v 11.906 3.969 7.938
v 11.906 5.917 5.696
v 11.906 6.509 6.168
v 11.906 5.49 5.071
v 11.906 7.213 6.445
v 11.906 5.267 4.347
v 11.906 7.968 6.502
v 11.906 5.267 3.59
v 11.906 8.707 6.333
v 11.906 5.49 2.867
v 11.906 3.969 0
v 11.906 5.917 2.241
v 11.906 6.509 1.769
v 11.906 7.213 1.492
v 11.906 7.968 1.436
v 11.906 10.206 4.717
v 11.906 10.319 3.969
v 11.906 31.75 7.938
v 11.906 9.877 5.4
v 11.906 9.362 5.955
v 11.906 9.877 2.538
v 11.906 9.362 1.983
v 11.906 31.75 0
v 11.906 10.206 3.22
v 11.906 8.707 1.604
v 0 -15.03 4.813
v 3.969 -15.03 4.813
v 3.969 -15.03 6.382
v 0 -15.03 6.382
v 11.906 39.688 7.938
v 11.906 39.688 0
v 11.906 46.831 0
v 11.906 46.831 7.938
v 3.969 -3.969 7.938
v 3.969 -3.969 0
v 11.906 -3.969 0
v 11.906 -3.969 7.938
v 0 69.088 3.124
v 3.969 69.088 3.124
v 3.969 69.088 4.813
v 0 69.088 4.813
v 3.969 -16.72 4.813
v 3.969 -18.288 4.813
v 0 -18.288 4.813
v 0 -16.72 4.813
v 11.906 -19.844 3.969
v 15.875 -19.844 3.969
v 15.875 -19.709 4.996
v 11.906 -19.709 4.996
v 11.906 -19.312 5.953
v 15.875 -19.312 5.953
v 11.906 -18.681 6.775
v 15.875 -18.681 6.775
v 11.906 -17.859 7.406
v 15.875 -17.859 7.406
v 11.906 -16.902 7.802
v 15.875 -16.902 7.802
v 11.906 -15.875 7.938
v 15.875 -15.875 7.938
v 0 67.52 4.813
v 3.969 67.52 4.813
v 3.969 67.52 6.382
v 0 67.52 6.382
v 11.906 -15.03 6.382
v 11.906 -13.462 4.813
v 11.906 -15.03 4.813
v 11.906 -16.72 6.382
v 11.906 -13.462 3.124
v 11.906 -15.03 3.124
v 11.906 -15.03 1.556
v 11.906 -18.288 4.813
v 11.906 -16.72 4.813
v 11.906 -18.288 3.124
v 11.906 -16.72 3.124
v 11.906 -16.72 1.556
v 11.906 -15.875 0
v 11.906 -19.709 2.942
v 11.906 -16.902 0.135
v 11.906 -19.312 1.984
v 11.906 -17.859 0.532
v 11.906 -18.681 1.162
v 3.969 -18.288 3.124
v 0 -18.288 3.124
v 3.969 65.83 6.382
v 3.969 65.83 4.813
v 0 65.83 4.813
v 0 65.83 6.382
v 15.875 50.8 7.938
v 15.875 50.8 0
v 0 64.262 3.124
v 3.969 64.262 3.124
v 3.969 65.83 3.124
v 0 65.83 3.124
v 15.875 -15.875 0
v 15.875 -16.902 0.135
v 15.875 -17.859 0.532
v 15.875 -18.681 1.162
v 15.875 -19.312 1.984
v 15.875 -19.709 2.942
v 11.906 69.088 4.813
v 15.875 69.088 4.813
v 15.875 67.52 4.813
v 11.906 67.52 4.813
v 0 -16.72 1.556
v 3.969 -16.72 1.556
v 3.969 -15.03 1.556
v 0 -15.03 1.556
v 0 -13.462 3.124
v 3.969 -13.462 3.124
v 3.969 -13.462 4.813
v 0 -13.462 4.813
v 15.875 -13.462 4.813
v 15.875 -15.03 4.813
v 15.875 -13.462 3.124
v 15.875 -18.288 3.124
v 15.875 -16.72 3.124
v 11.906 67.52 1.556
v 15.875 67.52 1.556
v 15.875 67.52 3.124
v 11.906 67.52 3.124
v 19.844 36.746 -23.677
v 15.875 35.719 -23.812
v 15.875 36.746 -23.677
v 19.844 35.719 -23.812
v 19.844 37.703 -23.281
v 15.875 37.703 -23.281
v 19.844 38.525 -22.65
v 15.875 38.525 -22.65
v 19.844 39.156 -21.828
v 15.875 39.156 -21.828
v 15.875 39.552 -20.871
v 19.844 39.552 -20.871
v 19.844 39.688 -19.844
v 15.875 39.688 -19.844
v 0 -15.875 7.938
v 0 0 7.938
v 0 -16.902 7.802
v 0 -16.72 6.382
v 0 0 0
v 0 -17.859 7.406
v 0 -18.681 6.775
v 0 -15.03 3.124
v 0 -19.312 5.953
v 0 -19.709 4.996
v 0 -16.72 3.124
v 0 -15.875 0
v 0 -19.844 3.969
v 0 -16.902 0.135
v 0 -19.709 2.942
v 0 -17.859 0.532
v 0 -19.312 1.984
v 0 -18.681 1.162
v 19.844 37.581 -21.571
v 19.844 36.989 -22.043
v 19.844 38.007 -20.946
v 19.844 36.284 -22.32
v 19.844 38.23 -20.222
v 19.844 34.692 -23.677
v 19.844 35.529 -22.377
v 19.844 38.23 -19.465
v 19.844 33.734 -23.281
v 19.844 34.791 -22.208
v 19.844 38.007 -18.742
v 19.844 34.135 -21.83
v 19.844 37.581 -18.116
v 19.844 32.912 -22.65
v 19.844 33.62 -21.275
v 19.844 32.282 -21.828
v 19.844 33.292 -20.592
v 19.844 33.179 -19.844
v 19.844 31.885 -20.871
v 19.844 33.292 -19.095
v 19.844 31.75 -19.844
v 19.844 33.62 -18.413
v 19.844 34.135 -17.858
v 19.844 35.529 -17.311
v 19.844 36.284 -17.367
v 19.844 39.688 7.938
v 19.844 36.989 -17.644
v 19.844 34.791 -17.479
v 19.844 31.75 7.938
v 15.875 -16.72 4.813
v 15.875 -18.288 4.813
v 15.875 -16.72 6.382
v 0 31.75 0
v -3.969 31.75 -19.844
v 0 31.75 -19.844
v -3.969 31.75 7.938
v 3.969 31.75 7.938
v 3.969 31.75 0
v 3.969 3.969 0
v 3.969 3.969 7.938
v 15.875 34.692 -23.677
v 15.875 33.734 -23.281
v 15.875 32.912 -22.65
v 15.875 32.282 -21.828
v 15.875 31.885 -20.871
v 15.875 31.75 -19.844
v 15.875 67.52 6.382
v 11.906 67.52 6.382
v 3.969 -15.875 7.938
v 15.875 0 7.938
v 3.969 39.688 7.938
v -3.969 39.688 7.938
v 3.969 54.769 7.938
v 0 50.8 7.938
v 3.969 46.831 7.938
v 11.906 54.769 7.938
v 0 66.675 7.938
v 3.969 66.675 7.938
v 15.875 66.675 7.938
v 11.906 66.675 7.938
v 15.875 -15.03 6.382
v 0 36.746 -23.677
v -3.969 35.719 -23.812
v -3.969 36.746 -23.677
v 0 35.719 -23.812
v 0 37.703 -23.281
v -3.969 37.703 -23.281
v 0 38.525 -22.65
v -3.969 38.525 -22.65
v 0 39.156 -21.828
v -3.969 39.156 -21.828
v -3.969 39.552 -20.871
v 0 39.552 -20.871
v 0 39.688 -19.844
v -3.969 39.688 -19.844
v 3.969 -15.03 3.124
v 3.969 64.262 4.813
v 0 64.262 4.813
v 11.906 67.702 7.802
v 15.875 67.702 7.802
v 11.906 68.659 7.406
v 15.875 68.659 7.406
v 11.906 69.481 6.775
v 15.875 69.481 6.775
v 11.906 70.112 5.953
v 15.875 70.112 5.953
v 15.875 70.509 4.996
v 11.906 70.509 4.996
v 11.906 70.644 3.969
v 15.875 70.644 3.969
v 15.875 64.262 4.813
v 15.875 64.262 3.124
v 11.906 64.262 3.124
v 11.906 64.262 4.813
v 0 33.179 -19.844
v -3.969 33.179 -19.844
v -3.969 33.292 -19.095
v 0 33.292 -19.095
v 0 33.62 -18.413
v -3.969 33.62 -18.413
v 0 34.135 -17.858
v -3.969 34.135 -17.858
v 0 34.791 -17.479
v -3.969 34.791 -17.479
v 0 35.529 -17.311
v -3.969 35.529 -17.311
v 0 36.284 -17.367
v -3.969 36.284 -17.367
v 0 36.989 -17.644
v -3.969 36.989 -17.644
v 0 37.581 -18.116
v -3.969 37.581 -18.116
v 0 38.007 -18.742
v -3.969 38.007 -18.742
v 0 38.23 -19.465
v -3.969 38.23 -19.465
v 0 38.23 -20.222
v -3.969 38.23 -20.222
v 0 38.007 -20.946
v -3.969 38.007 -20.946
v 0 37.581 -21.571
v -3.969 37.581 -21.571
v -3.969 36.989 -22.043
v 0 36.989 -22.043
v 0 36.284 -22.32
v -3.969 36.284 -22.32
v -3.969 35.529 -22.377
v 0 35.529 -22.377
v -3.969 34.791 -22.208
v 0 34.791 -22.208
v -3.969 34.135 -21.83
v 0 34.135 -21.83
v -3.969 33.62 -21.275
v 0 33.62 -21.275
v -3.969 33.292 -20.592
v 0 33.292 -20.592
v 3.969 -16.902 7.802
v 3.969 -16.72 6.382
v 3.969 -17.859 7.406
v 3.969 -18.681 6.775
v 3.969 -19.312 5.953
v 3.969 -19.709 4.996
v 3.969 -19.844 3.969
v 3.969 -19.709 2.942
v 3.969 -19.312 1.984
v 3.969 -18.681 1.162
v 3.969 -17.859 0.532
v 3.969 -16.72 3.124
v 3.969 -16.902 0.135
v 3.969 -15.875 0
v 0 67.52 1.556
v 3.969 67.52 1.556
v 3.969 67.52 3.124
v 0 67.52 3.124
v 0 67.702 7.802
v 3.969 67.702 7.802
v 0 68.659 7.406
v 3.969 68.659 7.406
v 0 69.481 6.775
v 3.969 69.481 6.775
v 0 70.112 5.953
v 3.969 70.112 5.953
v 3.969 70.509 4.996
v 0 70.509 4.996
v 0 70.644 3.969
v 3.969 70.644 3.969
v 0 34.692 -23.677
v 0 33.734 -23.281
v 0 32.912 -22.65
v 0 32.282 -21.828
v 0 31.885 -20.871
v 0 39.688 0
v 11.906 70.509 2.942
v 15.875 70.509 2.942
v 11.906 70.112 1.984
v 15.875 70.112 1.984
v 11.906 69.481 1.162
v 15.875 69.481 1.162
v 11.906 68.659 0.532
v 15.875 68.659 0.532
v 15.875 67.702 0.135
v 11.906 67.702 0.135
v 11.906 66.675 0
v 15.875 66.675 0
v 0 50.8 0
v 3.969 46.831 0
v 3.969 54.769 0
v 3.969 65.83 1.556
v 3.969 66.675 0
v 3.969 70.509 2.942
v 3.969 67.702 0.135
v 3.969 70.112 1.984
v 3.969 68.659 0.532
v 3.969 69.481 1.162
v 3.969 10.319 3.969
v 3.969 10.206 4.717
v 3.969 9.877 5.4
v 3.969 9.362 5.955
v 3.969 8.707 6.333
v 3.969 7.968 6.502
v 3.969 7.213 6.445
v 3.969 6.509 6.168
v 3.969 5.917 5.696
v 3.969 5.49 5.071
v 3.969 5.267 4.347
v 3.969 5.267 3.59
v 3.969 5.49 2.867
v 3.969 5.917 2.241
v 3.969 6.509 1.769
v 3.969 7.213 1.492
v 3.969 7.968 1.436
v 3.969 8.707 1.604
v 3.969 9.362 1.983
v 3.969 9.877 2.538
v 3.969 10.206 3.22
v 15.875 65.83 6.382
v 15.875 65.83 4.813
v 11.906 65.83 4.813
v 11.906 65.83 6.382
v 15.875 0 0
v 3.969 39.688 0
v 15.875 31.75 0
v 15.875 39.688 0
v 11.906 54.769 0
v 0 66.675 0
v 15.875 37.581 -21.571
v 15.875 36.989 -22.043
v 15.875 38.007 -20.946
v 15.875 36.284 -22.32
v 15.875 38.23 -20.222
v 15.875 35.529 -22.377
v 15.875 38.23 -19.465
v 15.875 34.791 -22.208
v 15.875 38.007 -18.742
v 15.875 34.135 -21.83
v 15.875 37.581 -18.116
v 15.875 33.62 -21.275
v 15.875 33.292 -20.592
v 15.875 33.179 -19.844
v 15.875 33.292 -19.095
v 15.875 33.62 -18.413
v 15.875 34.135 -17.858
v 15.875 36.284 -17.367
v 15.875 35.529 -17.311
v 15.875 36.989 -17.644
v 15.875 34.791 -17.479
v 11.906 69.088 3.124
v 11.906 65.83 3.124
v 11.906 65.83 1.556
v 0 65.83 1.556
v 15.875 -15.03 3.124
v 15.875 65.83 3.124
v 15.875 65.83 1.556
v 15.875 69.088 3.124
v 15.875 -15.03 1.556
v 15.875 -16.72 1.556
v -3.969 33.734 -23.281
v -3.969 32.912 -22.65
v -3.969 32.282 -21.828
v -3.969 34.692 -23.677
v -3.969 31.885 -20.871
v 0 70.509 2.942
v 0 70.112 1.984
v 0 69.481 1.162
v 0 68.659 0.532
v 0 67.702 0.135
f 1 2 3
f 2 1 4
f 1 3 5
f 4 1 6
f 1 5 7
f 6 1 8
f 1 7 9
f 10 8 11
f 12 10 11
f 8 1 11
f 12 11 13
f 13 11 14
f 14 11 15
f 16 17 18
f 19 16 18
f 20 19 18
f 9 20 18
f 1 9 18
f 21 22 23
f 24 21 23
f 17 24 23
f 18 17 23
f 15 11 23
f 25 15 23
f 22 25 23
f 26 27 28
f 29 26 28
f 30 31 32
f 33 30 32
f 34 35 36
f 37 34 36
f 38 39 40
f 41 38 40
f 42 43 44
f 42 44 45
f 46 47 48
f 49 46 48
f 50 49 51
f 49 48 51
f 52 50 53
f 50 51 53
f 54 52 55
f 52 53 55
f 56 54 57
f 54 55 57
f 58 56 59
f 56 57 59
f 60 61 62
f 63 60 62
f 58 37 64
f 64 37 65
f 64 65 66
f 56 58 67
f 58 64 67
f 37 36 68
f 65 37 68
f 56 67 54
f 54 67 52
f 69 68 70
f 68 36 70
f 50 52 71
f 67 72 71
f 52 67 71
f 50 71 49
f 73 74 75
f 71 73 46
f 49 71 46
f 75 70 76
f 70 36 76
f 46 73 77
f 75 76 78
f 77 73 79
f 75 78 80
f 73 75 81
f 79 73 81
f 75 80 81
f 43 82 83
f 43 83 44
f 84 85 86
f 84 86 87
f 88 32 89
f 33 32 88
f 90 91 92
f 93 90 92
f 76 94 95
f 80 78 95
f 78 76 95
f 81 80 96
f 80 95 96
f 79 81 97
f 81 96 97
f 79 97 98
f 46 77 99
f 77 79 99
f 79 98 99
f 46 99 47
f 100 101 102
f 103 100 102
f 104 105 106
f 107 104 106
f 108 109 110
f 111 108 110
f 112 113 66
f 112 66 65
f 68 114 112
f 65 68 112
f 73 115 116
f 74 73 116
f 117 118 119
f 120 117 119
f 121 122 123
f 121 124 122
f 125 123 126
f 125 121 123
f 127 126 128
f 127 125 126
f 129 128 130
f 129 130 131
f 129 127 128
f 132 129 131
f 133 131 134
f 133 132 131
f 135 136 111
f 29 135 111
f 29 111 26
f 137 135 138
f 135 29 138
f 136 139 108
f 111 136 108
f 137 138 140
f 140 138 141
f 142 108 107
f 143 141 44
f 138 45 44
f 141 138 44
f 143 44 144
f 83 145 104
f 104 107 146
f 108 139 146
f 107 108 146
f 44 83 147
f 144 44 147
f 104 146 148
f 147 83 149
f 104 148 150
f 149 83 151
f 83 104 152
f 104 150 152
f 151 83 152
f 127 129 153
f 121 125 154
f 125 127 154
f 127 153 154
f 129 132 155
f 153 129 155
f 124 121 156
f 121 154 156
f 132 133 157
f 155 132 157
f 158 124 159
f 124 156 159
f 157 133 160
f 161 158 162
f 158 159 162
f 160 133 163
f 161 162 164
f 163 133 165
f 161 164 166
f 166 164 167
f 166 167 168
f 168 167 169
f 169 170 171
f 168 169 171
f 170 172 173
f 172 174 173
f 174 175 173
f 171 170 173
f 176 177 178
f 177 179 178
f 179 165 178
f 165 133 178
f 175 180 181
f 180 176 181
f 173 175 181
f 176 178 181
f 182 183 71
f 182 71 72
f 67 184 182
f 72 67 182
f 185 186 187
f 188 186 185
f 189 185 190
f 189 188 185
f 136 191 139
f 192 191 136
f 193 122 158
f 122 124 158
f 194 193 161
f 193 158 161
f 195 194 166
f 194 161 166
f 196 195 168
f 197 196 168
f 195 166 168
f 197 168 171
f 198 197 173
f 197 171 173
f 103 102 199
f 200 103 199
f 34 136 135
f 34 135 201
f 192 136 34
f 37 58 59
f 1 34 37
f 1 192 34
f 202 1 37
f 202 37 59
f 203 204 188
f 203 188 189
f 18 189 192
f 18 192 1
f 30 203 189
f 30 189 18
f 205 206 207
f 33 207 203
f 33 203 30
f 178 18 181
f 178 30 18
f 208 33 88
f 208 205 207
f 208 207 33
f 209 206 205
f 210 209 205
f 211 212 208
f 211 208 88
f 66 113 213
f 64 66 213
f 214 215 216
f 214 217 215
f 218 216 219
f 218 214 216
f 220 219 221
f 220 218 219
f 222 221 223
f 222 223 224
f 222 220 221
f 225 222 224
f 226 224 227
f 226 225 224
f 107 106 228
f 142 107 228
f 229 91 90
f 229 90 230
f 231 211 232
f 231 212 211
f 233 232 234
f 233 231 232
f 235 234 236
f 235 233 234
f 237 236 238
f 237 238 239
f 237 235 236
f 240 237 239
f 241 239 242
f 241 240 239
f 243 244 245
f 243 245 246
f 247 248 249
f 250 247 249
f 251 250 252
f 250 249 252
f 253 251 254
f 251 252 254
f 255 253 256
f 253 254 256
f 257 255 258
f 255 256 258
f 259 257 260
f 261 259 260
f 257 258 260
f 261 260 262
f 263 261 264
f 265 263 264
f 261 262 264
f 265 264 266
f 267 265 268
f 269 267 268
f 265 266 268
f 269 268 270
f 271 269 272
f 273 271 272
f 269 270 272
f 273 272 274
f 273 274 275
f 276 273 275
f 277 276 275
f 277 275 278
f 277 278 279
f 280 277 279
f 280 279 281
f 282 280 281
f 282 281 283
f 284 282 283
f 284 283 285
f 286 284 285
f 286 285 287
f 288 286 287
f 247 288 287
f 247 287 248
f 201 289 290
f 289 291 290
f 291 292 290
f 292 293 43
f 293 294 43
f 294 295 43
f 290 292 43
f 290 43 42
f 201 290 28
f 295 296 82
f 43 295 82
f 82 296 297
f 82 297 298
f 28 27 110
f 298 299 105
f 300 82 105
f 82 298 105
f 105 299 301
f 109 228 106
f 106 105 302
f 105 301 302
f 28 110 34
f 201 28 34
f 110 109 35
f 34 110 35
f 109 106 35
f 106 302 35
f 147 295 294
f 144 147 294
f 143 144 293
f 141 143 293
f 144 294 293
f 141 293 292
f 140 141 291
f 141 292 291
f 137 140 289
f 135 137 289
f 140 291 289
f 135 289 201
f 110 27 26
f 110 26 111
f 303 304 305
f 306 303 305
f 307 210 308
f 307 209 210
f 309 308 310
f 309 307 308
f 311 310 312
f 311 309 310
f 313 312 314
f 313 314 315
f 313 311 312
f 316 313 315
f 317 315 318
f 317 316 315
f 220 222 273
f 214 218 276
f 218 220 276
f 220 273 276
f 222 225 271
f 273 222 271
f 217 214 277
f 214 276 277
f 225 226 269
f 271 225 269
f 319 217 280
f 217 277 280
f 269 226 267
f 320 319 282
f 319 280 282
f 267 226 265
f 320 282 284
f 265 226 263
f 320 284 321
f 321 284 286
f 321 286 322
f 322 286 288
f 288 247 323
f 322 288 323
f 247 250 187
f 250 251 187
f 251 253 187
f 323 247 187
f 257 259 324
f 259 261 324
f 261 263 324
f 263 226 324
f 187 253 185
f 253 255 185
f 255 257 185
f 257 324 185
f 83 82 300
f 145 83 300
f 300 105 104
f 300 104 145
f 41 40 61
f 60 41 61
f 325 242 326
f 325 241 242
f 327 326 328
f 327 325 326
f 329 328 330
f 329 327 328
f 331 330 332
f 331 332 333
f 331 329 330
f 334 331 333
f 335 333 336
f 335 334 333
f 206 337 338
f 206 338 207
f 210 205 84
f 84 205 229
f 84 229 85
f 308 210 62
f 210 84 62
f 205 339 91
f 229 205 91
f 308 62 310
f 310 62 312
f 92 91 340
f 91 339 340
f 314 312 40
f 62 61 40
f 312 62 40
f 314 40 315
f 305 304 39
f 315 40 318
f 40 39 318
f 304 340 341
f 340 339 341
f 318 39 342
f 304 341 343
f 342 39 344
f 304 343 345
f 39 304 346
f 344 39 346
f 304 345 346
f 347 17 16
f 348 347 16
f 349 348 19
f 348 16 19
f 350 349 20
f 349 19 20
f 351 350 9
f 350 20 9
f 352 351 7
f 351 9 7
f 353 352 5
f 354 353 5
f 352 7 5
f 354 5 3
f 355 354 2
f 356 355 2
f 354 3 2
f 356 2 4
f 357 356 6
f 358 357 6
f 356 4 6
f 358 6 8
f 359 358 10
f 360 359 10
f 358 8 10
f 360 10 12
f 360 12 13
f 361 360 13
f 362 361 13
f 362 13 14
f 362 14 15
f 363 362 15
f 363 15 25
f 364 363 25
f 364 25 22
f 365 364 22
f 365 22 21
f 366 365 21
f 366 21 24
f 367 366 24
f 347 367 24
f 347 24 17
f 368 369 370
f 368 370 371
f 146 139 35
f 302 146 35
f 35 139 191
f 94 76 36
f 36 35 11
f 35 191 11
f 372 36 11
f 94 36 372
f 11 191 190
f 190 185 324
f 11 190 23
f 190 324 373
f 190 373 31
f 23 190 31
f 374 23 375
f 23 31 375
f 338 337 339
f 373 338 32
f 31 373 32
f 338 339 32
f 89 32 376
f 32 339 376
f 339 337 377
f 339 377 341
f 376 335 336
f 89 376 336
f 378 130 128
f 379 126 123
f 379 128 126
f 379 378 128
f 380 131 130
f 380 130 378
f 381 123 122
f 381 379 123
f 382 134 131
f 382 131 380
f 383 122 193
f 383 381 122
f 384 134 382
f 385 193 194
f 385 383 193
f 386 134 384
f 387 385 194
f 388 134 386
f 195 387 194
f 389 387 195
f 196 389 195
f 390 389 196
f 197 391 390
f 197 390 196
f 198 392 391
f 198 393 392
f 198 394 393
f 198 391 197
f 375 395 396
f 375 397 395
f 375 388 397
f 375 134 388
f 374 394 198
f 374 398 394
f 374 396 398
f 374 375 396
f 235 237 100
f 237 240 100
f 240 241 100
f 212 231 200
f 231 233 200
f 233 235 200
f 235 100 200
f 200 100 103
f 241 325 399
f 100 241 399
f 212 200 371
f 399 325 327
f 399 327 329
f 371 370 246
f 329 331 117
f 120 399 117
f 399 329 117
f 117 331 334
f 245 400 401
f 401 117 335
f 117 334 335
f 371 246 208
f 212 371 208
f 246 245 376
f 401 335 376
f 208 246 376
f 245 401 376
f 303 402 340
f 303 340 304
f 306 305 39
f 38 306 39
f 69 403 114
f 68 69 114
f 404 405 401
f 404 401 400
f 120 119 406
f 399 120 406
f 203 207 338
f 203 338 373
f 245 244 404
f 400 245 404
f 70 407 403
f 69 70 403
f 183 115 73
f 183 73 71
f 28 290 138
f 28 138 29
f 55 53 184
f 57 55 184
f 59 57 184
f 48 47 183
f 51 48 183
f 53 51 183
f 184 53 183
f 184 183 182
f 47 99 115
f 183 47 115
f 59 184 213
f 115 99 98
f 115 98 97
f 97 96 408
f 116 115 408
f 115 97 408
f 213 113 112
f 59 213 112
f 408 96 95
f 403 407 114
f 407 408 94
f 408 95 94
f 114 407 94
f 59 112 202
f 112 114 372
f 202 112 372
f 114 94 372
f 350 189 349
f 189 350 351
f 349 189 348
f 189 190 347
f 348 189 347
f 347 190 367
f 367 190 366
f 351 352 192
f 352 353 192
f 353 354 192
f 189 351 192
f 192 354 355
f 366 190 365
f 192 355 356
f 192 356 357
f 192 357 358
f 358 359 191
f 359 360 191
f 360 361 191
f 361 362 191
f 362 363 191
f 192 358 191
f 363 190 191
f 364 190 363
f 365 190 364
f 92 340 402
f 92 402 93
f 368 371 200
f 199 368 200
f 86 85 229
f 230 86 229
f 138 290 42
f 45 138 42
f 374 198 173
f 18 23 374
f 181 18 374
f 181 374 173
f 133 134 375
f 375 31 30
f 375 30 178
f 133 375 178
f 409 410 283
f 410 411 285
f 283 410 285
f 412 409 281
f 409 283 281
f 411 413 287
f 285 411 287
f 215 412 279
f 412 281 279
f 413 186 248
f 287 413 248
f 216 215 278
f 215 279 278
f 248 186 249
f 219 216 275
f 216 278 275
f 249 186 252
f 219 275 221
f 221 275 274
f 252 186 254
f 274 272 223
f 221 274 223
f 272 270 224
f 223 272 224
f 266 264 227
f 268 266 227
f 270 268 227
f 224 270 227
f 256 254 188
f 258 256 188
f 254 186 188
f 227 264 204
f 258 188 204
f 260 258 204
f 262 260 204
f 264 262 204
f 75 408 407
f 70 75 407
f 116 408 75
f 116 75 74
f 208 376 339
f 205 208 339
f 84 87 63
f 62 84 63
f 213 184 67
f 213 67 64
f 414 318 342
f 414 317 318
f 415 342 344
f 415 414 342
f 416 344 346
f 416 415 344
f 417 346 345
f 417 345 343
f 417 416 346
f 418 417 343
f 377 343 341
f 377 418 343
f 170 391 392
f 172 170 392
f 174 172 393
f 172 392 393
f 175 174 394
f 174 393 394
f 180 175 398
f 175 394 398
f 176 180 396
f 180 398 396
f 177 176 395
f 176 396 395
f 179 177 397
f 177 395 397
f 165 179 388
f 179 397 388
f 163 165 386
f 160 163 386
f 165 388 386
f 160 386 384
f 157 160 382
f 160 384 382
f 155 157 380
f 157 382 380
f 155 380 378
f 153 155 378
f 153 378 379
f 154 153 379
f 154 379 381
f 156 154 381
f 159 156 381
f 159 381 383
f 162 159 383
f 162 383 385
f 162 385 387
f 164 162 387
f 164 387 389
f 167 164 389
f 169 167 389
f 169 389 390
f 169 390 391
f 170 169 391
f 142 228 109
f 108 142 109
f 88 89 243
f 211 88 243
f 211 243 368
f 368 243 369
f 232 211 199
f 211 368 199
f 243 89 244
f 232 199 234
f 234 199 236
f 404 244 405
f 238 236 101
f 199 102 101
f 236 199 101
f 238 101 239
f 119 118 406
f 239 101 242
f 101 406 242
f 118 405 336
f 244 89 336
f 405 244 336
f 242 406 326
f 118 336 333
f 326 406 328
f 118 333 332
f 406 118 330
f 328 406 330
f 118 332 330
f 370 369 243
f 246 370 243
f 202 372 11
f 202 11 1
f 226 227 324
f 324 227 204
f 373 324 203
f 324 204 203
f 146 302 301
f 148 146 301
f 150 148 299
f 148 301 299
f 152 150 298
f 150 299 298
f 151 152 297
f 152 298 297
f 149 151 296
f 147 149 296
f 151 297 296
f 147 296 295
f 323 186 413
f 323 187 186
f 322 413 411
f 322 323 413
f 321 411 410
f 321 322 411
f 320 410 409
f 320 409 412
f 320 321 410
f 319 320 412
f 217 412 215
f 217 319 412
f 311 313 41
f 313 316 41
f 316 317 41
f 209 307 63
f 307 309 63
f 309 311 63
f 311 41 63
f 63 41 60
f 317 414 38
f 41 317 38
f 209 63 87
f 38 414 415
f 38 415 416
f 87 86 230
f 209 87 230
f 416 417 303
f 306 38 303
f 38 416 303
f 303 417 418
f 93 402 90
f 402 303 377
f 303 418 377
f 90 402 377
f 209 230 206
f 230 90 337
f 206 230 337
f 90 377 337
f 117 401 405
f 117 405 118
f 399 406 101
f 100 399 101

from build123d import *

# Parameters (mm, degrees)
F1_DEPTH  = 7.9375
F2_R      = 2.54
F2_W      = 1.6891
F2_H      = 1.56845
F2_H_2    = 1.6891
F2_W_2    = 1.56845
F3_DEPTH  = 15.875
F4_SIZE   = 3.96874
F5_W      = 7.9375
F5_H      = 7.9375
F6_DEPTH  = 7.9375
F7_W      = 3.96875
F7_H      = 7.9375
F8_DEPTH  = 23.8125
F9_R      = 3.96874
F10_R     = 2.54
F11_DEPTH = 23.8125
F12_W     = 1.6891
F12_H     = 1.56845
F12_W_2   = 1.56845
F12_H_2   = 1.6891
F13_DEPTH = 15.875


# Not quite as in the source:
# - a fillet or chamfer is up to 0.001 mm smaller than in the source, because OpenCascade refuses the exact size


with BuildPart() as f1:
    # F0 (on Top) → F1 (new body)
    with BuildSketch(Plane.XY):
        Polygon((3.96875, 0), (0, 0), (0, -19.84375), (3.96875, -19.84375), (3.96875, -3.96875), (11.90625, -3.96875), (11.90625, -19.84375), (15.875, -19.84375), (15.875, 0), (11.90625, 0), (11.90625, 50.8), (15.875, 50.8), (15.875, 70.64375), (11.90625, 70.64375), (11.90625, 54.76875), (3.96875, 54.76875), (3.96875, 70.64375), (0, 70.64375), (0, 50.8), (3.96875, 50.8), align=None)
    extrude(amount=F1_DEPTH)

    # F2 (on face) → F3 (cut, through all)
    with BuildSketch(Plane.YZ.offset(15.875)):
        with BuildLine():
            ThreePointArc((-15.875, 0), (-18.6813300378, 1.1624199622), (-19.84375, 3.96875))
            Line((-19.84375, 3.96875), (-19.84375, 0))
            Line((-19.84375, 0), (-15.875, 0))
        make_face()
        with BuildLine():
            ThreePointArc((-19.84375, 3.96875), (-18.6813300378, 6.7750800378), (-15.875, 7.9375))
            Line((-15.875, 7.9375), (-19.84375, 7.9375))
            Line((-19.84375, 7.9375), (-19.84375, 3.96875))
        make_face()
        with Locations((7.778559196, 3.96875)):
            Circle(F2_R)
        with Locations((-15.875, 5.597525)):
            Rectangle(F2_W, F2_H)
        with Locations((-15.875, 3.96875)):
            Rectangle(F2_W, F2_H_2)
        with Locations((-17.503775, 3.96875)):
            Rectangle(F2_W_2, F2_H_2)
        with Locations((-14.246225, 3.96875)):
            Rectangle(F2_W_2, F2_H_2)
        with Locations((-15.875, 2.339975)):
            Rectangle(F2_W, F2_H)
    extrude(amount=-F3_DEPTH, mode=Mode.SUBTRACT)

    # F4 (size 3.96875 in the source; OpenCascade refuses exactly that, so slightly less here)
    f4_edges = [f1.edges().sort_by_distance(p)[0] for p in [
        (11.90625, 0, 3.96875),
        (3.96875, 0, 3.96875),
        (11.90625, 50.8, 3.96875),
        (3.96875, 50.8, 3.96875),
    ]]
    chamfer(f4_edges, length=F4_SIZE)

    # F5 (on face) → F6 (join, through all)
    with BuildSketch(Plane.XY.offset(7.9375)):
        with Locations((0, 35.71875)):
            Rectangle(F5_W, F5_H)
        with Locations((15.875, 35.71875)):
            Rectangle(F5_W, F5_H)
    extrude(amount=-F6_DEPTH)

    # F7 (on face) → F8 (join)
    with BuildSketch(Plane(origin=(0, 0, 0), x_dir=(1, 0, 0), z_dir=(0, 0, -1))):
        with Locations((17.859375, -35.71875)):
            Rectangle(F7_W, F7_H)
        with Locations((-1.984375, -35.71875)):
            Rectangle(F7_W, F7_H)
    extrude(amount=F8_DEPTH)

    # F9 (radius 3.96875 in the source; OpenCascade refuses exactly that, so slightly less here)
    f9_edges = [f1.edges().sort_by_distance(p)[0] for p in [
        (-1.984375, 39.6875, -23.8125),
        (-1.984375, 31.75, -23.8125),
        (17.859375, 31.75, -23.8125),
        (17.859375, 39.6875, -23.8125),
        (13.890625, 70.64375, 0),
        (13.890625, 70.64375, 7.9375),
        (1.984375, 70.64375, 7.9375),
        (1.984375, 70.64375, 0),
    ]]
    fillet(f9_edges, radius=F9_R)

    # F10 (on face) → F11 (cut, through all)
    with BuildSketch(Plane(origin=(-3.96875, 0, 0), x_dir=(0, -1, 0), z_dir=(-1, 0, 0))):
        with Locations((-35.71875, -19.84375)):
            Circle(F10_R)
    extrude(amount=-F11_DEPTH, mode=Mode.SUBTRACT)

    # F12 (on face) → F13 (cut, through all)
    with BuildSketch(Plane.YZ.offset(15.875)):
        with Locations((66.675, 2.339975)):
            Rectangle(F12_W, F12_H)
        with Locations((65.046225, 3.96875)):
            Rectangle(F12_W_2, F12_H_2)
        with Locations((66.675, 3.96875)):
            Rectangle(F12_W, F12_H_2)
        with Locations((68.303775, 3.96875)):
            Rectangle(F12_W_2, F12_H_2)
        with Locations((66.675, 5.597525)):
            Rectangle(F12_W, F12_H)
    extrude(amount=-F13_DEPTH, mode=Mode.SUBTRACT)


solid = f1.part
